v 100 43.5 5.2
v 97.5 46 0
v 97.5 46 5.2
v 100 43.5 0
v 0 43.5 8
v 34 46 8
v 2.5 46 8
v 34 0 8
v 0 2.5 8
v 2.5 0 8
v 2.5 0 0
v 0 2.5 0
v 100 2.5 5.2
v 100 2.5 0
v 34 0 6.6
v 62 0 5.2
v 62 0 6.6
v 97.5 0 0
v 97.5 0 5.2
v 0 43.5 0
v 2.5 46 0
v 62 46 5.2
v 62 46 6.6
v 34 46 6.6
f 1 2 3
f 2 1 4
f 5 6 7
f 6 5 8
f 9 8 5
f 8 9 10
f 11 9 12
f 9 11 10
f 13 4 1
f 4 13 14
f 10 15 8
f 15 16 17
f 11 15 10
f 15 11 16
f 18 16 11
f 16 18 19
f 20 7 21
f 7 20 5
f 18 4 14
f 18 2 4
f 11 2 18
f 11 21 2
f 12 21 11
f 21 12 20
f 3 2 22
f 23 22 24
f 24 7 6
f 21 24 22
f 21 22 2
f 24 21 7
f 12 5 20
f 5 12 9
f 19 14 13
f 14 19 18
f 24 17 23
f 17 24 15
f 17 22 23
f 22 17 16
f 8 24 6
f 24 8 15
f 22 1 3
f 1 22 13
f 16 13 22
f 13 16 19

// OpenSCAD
$fn = 32;

// ----------------------------------------------------------------------
// Stepped bar: twostep, 100 x 46 x 8/5.2 mm
// ----------------------------------------------------------------------

// --- parameters (mm) ---
bar_l = 100;              // bar length, X
bar_w = 46;               // bar width, Y
plate_t = 8;              // thickness of the thick zone, Z
thin_t = 5.2;             // thickness of the thin zone
corner_c = 2.5;           // corner chamfer of the bar
step_cut = 2.8;           // material removed from the thin zone
stair1_x = 34;            // position of the first stair
stair2_x = 62;            // position of the second stair
mid_t = 6.6;              // thickness of the middle zone
depth_1 = 1.4;            // depth of cut 1 from the top face
depth_2 = 2.8;            // depth of cut 2 from the top face

profile = [[2.5, 0], [97.5, 0], [100, 2.5], [100, 43.5], [97.5, 46], [2.5, 46], [0, 43.5], [0, 2.5]];  // primary outline, 8 points, counter clockwise
void_1 = [[34, -1], [62, -1], [62, 47], [34, 47]];  // first stair, 4 points
void_2 = [[62, -1], [101, -1], [101, 47], [62, 47]];  // second stair, 4 points

// --- the one profile operation ---
difference() {
  linear_extrude(height = plate_t) polygon(points = profile);
  translate([0, 0, plate_t - depth_1])
    linear_extrude(height = depth_1 + 1) polygon(points = void_1);
  translate([0, 0, plate_t - depth_2])
    linear_extrude(height = depth_2 + 1) polygon(points = void_2);
}
